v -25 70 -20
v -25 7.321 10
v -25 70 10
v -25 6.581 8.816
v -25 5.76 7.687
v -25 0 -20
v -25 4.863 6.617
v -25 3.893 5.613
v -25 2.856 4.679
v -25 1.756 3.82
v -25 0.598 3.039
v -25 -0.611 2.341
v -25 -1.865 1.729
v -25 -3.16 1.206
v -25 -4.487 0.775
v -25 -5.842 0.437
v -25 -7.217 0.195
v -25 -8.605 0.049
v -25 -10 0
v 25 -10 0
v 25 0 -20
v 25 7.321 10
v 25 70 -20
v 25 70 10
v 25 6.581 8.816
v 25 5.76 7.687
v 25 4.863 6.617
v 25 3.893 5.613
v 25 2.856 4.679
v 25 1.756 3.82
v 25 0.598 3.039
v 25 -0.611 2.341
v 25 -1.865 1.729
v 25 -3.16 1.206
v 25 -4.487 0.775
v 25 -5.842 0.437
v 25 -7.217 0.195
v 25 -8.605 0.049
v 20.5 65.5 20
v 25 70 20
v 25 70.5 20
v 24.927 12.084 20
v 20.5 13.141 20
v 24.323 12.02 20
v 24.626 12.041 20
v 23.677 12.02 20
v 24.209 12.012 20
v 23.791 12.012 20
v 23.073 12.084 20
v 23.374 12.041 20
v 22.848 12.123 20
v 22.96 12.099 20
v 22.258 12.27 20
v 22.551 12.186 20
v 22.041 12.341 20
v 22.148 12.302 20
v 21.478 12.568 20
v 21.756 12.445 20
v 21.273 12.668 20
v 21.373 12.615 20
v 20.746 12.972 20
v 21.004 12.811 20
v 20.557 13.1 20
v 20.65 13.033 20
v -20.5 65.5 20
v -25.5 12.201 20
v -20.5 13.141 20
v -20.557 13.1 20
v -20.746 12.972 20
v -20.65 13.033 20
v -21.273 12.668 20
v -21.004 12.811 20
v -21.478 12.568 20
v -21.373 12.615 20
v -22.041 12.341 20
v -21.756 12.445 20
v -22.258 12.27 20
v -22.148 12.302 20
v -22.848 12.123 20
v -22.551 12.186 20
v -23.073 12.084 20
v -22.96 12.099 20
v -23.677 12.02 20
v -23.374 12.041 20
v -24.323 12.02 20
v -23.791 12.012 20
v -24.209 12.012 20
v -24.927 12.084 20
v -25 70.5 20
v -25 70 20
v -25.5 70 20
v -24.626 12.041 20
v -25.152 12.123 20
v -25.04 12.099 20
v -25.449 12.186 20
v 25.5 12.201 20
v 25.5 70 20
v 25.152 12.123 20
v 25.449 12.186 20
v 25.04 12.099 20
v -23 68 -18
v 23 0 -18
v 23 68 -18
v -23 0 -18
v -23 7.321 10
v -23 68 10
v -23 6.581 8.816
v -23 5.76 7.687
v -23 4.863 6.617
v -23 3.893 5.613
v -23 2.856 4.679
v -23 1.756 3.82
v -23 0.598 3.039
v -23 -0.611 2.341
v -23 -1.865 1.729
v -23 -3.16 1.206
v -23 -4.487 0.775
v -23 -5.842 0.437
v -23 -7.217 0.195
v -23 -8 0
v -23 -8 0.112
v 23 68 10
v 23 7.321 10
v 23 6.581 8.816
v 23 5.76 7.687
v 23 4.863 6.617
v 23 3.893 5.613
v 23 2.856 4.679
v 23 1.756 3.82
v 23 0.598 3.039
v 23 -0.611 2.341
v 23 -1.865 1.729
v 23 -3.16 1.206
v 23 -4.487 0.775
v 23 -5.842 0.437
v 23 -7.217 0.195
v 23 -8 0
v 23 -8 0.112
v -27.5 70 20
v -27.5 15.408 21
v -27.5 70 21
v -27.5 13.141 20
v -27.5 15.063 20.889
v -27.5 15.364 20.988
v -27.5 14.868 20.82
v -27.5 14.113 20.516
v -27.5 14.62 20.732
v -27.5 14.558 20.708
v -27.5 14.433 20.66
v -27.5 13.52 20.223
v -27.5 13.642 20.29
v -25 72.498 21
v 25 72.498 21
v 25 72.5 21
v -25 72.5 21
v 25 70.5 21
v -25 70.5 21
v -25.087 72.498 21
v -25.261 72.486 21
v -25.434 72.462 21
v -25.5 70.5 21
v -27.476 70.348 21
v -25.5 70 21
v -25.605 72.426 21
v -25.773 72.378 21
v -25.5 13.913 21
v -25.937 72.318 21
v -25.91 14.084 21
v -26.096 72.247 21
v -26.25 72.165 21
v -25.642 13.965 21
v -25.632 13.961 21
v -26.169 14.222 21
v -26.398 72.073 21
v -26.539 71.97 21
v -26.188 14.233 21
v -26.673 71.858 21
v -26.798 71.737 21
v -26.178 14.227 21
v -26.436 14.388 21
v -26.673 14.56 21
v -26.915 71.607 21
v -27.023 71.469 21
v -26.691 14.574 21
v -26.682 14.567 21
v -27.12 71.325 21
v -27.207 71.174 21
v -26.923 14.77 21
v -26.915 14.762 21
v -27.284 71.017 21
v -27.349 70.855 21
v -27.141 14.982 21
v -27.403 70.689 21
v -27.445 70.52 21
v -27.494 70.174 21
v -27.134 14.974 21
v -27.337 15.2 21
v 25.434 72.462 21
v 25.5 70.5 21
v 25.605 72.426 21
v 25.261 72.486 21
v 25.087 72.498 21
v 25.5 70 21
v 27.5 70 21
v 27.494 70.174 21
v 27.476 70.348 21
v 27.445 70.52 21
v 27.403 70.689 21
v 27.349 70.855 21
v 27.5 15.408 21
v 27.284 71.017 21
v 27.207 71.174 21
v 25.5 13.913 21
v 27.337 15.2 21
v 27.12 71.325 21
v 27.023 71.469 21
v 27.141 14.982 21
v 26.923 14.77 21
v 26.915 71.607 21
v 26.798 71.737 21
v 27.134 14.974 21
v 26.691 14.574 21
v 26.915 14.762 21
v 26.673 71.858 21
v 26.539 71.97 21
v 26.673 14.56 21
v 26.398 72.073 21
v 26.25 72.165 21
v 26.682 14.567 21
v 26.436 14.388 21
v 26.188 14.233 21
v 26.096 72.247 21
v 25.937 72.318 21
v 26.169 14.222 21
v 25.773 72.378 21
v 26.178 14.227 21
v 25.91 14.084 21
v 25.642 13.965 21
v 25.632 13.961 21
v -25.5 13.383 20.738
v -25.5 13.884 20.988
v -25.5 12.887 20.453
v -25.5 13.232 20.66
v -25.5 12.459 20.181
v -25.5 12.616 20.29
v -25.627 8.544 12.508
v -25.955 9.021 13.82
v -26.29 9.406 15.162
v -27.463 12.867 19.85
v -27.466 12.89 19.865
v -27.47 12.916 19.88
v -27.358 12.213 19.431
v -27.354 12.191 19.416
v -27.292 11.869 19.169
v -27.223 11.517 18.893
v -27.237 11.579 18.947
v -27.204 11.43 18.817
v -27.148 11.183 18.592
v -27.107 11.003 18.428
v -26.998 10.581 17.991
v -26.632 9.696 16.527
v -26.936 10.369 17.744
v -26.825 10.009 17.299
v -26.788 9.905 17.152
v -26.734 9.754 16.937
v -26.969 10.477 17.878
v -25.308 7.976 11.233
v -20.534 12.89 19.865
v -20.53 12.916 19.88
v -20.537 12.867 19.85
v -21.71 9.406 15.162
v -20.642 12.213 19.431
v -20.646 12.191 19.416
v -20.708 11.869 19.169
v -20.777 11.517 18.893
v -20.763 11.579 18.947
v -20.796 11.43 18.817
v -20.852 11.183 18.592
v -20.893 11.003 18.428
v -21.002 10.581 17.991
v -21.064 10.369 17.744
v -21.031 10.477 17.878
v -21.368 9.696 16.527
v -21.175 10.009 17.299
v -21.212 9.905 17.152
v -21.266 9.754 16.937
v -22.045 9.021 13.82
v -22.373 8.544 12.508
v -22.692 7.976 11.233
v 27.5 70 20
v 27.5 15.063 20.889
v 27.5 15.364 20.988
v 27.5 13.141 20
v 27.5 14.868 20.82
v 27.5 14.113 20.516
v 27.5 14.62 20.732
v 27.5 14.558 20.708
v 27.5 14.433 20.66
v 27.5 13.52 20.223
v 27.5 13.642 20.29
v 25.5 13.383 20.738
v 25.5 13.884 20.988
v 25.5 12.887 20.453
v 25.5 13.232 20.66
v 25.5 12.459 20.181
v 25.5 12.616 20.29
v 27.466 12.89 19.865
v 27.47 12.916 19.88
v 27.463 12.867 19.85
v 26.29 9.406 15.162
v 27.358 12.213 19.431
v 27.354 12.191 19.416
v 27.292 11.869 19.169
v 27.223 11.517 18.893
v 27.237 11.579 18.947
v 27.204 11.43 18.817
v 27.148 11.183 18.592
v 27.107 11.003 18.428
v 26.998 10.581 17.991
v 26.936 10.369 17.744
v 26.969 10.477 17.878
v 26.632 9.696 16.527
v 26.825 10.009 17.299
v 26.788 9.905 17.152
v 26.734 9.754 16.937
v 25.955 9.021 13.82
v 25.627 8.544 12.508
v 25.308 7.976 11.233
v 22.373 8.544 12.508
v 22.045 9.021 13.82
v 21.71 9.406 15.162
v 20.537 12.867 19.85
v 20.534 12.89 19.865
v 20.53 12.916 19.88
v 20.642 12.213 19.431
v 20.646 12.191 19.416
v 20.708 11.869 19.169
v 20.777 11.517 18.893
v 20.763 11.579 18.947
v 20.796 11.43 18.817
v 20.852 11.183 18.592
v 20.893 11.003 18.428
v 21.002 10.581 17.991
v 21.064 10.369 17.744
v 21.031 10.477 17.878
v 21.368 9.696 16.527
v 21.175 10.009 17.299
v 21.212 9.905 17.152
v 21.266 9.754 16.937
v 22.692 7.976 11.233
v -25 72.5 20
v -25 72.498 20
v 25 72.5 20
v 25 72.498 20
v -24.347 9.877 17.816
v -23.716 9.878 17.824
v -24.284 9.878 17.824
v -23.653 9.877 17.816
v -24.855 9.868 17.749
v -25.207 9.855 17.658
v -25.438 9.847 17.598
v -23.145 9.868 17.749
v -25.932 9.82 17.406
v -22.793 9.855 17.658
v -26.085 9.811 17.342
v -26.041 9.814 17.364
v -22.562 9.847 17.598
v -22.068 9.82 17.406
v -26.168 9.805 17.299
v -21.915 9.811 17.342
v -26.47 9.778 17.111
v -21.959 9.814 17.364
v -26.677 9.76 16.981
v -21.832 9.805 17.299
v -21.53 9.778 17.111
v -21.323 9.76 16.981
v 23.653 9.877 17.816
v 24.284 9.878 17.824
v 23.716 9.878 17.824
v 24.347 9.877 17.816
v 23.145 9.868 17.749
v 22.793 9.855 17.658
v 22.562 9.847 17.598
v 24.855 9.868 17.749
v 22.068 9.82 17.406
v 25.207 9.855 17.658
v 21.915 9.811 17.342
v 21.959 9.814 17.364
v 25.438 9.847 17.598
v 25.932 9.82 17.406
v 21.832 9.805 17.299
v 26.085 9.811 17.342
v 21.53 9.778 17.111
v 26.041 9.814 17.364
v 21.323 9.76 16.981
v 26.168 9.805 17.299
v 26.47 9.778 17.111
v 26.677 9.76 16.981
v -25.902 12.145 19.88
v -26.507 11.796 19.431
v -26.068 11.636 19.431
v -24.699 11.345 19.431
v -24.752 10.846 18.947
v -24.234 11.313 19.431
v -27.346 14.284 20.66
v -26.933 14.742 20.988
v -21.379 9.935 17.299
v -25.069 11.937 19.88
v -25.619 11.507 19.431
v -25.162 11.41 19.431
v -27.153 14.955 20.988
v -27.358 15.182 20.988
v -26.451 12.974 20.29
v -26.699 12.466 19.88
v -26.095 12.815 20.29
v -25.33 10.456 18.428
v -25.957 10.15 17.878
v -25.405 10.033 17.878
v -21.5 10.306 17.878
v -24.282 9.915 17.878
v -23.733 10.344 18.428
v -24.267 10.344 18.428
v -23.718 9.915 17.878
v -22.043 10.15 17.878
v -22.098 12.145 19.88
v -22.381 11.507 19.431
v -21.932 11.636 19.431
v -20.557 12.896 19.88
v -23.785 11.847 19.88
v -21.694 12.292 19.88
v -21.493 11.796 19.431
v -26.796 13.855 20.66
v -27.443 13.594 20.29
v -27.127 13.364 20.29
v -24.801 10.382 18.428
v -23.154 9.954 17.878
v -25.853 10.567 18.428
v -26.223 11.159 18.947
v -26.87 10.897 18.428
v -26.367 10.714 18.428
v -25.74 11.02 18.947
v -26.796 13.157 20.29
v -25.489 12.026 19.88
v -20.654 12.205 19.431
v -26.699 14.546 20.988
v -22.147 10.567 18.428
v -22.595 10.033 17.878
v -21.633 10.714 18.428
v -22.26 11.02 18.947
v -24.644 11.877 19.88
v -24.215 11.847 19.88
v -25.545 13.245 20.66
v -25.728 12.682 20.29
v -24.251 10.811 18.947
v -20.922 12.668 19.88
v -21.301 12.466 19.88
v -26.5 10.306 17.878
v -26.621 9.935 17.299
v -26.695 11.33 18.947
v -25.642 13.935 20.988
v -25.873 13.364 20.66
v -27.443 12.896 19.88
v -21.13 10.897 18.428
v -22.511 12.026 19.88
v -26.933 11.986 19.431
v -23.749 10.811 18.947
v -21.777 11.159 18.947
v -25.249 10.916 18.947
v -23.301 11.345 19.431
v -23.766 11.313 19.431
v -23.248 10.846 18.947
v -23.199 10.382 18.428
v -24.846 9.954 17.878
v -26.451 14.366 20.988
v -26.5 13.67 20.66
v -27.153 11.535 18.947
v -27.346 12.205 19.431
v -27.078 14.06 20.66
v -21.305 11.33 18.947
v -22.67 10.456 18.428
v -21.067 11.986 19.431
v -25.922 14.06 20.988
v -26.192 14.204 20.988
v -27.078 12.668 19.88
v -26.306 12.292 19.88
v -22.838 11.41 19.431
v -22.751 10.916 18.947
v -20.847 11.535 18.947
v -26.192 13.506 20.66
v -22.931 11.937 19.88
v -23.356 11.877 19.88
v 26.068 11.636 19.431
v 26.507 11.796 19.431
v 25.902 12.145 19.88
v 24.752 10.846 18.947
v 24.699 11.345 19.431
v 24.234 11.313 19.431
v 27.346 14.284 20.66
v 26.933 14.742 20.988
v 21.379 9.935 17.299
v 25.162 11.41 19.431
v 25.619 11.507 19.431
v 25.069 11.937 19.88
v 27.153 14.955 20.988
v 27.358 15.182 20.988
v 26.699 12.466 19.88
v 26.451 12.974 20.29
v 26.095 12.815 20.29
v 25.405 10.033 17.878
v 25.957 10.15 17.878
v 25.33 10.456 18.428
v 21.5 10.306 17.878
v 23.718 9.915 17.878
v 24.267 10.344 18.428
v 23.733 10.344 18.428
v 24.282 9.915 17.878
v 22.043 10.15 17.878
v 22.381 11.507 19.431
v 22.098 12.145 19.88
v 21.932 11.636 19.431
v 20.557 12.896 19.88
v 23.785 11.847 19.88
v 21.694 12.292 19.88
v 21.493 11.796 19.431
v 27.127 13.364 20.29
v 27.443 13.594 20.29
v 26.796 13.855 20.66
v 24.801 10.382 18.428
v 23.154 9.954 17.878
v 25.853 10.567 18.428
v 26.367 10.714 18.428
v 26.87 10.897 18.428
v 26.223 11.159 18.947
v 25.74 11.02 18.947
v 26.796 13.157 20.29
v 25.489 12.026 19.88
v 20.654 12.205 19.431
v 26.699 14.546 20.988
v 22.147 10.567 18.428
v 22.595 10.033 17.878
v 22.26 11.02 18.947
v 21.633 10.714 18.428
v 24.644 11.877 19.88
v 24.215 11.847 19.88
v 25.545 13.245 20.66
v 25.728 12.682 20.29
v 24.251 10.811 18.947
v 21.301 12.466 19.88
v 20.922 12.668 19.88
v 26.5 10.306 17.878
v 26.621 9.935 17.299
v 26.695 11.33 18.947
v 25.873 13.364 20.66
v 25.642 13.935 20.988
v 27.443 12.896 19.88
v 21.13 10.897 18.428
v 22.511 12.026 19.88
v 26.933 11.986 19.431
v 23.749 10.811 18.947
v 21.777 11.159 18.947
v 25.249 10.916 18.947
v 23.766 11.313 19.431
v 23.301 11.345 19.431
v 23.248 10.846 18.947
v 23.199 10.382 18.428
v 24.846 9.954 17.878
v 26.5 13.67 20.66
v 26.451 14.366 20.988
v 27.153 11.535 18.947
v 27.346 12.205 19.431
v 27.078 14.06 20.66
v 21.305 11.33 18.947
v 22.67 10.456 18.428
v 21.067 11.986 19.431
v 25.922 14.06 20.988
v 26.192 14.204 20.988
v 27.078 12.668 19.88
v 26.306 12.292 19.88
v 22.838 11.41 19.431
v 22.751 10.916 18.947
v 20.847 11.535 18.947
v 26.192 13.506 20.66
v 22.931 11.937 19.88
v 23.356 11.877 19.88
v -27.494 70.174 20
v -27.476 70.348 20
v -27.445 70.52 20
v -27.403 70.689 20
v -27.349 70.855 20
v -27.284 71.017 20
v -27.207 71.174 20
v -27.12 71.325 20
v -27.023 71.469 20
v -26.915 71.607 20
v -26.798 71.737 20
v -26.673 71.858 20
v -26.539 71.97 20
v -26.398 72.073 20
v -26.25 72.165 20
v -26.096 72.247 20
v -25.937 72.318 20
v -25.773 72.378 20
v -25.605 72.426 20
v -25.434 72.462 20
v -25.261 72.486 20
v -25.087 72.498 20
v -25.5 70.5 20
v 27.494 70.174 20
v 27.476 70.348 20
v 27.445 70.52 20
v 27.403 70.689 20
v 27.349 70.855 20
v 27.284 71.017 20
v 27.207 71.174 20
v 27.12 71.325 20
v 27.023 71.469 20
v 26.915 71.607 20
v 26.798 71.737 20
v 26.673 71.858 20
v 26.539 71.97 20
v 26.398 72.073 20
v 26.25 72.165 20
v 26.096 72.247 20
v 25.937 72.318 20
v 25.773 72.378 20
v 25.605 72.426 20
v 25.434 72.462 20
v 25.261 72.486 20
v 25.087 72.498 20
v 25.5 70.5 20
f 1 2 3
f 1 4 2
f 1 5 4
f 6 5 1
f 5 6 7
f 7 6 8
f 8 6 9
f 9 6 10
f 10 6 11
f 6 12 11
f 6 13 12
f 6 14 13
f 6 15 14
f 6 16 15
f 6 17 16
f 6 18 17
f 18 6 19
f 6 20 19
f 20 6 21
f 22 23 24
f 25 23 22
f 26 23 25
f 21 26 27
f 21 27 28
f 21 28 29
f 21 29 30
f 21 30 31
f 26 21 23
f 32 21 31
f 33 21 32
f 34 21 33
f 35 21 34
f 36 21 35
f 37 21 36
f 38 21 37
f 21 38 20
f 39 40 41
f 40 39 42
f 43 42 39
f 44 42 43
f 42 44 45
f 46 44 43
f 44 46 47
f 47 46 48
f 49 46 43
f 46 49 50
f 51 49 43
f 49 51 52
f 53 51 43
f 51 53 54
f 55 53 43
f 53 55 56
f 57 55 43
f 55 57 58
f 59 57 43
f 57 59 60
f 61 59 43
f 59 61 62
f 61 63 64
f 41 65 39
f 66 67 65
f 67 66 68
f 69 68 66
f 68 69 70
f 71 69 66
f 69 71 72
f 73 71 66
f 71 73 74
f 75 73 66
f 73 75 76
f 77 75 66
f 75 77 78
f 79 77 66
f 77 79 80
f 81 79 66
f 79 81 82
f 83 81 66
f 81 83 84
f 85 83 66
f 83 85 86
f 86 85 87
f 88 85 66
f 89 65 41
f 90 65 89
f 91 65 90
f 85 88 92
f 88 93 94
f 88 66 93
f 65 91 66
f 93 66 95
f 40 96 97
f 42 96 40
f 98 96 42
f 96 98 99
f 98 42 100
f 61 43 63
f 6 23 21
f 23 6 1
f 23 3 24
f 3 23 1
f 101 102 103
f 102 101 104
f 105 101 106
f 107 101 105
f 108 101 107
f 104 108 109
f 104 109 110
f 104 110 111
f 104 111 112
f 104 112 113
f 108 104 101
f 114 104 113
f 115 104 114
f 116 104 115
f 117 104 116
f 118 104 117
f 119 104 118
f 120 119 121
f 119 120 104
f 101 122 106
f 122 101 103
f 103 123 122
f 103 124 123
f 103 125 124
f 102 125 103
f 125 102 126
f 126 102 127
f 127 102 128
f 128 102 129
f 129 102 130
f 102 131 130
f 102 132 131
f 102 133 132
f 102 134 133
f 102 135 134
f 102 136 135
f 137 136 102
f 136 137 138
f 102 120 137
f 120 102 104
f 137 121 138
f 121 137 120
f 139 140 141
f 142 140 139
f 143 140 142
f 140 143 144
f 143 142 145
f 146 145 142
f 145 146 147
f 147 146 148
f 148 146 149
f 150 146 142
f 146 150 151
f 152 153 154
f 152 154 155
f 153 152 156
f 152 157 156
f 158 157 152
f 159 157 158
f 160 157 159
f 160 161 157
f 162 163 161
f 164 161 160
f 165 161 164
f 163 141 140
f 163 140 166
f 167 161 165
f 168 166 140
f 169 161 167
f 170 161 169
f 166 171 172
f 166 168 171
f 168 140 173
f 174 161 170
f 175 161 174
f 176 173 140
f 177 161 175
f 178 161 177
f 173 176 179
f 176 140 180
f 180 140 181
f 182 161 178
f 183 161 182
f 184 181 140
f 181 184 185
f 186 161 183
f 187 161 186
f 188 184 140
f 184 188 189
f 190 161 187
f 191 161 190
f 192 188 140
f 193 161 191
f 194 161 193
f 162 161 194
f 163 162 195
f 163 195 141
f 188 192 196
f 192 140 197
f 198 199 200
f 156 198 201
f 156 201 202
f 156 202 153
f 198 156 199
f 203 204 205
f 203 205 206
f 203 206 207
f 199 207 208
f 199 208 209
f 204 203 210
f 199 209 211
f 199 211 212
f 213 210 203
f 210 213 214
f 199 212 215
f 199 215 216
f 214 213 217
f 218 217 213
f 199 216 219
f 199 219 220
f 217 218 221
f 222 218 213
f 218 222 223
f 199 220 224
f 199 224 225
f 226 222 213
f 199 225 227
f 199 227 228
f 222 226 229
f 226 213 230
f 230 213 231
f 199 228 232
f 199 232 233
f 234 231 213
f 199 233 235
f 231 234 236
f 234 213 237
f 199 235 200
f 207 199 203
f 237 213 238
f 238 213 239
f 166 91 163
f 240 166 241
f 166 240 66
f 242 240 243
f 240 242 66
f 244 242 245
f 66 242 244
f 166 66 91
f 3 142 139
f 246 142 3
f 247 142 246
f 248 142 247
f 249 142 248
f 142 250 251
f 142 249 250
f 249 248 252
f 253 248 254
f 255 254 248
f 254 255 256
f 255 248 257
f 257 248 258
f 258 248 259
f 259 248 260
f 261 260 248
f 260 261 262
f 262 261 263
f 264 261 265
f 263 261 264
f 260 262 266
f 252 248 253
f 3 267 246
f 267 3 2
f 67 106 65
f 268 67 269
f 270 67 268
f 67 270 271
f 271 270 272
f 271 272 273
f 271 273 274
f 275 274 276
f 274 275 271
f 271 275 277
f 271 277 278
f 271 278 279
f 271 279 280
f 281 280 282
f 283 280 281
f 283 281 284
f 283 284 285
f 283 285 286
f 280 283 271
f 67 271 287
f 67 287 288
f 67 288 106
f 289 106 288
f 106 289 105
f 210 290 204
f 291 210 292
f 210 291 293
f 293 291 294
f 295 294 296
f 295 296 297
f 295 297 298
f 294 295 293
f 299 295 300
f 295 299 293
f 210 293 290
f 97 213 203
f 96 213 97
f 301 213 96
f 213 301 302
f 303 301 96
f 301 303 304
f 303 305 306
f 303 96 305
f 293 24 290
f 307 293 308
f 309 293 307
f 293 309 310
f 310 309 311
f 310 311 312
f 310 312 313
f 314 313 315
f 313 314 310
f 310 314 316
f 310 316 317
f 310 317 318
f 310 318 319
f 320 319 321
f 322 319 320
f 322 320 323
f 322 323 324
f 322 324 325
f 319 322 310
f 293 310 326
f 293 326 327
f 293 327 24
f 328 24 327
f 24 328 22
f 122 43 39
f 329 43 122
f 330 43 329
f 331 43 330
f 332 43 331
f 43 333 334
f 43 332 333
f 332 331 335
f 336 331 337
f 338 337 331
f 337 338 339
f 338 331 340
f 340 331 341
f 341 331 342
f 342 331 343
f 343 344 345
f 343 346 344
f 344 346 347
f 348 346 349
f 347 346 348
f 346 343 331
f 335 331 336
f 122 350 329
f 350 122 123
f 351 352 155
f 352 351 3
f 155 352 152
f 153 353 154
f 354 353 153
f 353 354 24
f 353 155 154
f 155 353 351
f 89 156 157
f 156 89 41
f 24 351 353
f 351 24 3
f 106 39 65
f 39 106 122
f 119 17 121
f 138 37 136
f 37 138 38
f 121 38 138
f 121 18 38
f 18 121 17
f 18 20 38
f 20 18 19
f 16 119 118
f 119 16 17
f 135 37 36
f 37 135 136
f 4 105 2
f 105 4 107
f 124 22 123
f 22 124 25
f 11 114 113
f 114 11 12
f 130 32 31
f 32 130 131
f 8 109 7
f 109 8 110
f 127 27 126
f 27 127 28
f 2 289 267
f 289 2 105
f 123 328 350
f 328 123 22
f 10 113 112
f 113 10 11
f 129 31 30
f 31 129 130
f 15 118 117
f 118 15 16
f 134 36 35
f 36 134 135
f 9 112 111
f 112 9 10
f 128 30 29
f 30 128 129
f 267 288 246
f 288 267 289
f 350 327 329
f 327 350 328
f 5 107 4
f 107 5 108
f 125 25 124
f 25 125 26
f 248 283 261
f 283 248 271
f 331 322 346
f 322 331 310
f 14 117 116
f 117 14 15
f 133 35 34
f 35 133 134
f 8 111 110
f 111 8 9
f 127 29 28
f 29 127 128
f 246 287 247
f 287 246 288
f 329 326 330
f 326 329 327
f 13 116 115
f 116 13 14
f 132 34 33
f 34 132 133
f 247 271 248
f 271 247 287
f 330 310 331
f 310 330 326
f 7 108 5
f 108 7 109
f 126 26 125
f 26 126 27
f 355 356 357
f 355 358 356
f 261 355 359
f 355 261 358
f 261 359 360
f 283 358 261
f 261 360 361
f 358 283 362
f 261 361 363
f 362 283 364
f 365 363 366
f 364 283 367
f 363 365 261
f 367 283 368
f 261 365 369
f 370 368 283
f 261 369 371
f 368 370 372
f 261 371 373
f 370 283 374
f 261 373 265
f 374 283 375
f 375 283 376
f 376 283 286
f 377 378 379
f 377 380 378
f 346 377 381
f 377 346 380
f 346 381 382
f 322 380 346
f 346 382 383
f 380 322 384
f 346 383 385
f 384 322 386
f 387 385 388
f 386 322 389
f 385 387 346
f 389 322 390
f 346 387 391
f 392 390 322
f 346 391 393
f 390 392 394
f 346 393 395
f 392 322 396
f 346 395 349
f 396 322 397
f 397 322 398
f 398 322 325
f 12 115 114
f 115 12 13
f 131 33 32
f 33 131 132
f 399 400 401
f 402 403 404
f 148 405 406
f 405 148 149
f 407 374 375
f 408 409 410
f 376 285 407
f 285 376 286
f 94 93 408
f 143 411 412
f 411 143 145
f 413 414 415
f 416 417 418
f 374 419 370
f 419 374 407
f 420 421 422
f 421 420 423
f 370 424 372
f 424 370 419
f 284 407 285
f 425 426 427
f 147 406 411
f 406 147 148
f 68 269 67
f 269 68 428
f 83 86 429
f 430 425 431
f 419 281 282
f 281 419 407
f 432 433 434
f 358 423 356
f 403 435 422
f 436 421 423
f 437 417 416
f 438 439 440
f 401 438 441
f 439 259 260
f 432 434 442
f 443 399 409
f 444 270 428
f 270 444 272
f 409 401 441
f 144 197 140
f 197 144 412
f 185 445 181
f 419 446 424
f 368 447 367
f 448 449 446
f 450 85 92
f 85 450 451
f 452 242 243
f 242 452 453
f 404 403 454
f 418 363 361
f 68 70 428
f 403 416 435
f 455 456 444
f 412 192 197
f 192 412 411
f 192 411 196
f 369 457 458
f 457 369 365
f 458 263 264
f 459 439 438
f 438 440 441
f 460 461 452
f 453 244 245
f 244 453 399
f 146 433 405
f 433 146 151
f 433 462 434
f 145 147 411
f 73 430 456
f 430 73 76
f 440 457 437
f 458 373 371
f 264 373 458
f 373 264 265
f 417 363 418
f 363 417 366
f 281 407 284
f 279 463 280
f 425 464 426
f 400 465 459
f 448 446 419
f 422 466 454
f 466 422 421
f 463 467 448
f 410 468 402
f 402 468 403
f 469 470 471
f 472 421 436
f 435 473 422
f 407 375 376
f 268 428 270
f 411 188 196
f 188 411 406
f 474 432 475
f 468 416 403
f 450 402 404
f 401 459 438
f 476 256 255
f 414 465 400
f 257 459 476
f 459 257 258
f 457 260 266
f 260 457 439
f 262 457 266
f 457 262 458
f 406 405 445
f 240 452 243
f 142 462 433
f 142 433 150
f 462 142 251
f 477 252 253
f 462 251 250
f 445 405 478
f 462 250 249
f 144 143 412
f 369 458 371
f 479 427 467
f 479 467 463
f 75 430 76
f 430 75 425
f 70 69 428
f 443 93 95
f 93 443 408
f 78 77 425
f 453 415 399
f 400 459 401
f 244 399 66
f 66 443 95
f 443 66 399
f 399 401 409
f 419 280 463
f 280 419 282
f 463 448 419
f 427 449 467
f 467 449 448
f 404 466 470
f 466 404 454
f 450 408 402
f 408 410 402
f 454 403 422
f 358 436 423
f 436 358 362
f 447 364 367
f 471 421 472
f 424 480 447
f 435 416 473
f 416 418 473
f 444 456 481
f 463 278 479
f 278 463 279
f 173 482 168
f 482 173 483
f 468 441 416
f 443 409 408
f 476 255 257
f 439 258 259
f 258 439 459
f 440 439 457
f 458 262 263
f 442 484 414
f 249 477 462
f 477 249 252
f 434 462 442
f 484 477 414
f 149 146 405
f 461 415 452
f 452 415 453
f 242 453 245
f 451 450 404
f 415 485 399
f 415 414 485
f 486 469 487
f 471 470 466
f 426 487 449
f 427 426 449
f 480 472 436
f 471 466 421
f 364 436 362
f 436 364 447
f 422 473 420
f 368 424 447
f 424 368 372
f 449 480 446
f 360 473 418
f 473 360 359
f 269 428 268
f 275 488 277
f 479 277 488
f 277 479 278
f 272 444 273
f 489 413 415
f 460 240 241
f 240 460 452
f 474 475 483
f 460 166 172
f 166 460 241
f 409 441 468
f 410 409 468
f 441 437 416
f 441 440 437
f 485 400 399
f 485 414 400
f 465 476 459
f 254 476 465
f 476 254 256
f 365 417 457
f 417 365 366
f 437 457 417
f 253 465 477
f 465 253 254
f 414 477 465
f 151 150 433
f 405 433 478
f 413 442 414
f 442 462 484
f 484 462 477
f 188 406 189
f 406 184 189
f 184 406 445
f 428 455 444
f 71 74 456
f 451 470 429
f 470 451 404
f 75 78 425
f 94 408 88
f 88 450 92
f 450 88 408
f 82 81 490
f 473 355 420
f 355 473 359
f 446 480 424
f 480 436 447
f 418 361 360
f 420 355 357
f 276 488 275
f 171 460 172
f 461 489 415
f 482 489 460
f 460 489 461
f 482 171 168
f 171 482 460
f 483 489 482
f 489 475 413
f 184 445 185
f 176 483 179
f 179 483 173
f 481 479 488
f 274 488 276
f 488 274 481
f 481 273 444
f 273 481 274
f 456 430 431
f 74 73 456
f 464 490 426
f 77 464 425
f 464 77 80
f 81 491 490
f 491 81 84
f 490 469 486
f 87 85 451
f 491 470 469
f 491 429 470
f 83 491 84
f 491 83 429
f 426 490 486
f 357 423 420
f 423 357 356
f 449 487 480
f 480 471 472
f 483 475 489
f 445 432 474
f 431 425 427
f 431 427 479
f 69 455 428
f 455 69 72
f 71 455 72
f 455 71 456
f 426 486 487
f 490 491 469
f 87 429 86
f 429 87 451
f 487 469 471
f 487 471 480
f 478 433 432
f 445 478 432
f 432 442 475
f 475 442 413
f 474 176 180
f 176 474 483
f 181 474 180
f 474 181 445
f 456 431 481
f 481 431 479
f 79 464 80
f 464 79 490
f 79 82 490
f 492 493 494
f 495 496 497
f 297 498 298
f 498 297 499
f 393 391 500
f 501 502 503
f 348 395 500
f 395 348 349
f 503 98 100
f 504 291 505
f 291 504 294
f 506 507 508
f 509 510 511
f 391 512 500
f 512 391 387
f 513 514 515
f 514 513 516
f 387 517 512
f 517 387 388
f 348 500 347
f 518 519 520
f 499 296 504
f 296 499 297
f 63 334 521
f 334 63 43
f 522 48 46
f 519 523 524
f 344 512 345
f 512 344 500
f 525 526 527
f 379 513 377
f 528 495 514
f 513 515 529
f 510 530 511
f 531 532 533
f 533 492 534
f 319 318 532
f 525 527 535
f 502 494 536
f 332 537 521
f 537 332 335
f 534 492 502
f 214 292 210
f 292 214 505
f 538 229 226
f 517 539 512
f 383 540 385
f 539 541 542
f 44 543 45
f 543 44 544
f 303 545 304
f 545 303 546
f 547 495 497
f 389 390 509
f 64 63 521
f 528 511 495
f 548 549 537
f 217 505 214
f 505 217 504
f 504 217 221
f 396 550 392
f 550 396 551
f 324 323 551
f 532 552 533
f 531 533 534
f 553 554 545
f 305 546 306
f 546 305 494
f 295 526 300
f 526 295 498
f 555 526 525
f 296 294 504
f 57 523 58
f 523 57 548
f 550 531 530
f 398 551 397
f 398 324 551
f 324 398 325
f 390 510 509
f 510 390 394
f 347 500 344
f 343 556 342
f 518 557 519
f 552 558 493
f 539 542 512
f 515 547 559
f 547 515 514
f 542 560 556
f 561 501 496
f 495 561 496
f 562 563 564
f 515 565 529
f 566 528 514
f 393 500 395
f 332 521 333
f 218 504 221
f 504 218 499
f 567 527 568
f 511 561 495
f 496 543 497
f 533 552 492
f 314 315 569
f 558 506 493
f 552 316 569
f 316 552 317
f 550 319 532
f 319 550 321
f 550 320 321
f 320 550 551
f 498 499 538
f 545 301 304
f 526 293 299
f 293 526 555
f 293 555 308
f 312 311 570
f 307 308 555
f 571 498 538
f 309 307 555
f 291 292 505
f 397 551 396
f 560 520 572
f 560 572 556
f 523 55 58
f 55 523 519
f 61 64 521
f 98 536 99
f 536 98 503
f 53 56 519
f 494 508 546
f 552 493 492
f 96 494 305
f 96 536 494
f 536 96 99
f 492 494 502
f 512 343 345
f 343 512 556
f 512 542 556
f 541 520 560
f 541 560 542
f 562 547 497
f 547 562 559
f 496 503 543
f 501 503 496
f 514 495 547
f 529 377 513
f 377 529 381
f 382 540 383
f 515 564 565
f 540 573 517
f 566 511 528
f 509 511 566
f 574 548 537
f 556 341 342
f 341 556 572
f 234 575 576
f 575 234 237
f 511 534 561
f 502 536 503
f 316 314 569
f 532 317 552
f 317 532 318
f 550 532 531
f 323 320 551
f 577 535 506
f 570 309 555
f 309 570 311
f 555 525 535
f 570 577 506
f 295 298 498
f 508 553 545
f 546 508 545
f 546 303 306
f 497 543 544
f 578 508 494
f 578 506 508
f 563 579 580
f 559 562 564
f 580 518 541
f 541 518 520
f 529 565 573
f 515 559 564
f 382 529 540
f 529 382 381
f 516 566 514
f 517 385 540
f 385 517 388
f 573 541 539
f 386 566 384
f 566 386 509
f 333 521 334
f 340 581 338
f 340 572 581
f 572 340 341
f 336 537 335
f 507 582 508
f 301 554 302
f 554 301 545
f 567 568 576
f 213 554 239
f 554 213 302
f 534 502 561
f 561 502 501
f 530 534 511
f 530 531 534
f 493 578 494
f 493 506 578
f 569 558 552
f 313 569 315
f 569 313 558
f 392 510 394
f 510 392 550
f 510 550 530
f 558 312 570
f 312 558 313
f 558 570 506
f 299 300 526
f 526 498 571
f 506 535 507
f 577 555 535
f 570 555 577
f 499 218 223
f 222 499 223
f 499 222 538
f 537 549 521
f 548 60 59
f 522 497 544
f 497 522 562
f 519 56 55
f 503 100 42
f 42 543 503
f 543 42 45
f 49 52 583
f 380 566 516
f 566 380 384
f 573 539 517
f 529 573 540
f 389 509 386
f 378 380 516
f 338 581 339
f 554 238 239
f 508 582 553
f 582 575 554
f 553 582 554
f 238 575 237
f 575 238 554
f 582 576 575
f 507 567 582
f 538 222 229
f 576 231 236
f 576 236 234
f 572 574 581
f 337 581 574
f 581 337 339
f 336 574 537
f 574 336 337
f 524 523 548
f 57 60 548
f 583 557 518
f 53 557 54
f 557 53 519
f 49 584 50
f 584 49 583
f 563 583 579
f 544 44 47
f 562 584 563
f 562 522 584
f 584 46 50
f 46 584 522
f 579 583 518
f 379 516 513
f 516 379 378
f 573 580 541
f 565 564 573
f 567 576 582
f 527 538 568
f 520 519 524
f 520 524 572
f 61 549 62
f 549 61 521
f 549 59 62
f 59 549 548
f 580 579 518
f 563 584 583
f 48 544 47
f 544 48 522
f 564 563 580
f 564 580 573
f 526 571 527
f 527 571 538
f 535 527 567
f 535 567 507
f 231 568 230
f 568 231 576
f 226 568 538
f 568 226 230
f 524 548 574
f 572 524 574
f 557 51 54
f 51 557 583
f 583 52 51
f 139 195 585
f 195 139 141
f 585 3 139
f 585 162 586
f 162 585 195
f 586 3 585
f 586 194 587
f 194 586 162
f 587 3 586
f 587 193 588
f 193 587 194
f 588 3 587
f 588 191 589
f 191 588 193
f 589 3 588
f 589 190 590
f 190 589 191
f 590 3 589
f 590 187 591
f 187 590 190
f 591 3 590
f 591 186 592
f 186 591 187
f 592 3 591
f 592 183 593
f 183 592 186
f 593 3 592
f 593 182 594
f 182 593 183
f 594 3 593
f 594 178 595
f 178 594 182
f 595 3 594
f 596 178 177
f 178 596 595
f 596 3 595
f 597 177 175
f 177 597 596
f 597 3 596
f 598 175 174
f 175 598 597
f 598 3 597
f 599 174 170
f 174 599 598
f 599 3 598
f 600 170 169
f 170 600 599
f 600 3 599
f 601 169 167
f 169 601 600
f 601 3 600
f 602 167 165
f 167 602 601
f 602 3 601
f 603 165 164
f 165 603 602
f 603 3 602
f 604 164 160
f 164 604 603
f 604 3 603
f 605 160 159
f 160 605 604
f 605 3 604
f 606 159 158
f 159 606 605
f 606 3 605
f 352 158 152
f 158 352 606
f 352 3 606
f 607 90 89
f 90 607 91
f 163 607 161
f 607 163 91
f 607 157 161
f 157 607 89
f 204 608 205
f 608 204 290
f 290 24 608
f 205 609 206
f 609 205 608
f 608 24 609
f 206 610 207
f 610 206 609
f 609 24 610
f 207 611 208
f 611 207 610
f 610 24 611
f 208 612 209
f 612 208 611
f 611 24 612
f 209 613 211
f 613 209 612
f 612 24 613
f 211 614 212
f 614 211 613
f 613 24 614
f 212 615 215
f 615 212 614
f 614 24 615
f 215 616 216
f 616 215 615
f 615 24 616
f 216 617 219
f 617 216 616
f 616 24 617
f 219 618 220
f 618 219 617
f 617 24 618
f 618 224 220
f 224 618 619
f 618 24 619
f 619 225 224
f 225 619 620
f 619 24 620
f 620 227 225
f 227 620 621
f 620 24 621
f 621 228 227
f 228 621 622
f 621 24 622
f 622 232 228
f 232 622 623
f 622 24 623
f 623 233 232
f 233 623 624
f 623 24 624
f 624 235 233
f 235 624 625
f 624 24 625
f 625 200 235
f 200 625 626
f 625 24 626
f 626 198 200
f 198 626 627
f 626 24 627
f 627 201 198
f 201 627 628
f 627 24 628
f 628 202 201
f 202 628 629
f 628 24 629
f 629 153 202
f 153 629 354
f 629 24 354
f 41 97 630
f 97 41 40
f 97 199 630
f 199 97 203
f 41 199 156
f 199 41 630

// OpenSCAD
//global
$fn=90;
width=50;
depth=80;
height=40;
wall=2;
tolerance=0.5;

//polygons as modules
module p_box_out(){
 polygon(points=[[0,-height/4],[height/2,0],[height/2,depth-height/4],[0,depth-height/4]]);
}

module p_box_in(){
 polygon(points=[[0,-(height/4-wall)],[height/2-wall,0],[height/2-wall,depth-height/4-wall],[0,depth-height/4-wall]]);
}

module p_mount_out(){
 polygon(points=[[0,0],[-10,0],[-10,tolerance],[-11,tolerance],[-11,tolerance+wall],[-10,tolerance+wall]]);
}

module p_mount_in(){
 polygon(points=[[0,-wall],[-10,-wall],[-10,-(tolerance+2*wall)]]);
}

//other modules
module mount_corner(){
 difference(){
  intersection(){
   rotate_extrude()
    rotate([0,0,-90])
     p_mount_out();
   rotate([0,0,90])
    cube(size=[tolerance+5,tolerance+5,15]);
  }
  translate([0,0,11])
   cube(size=[tolerance*2,tolerance*2,2],center=true);
 }
}

module cut_sphere(){
 difference(){ 
  translate([-15/2,-15,0])
   cube(size=15);
  sphere(r=10);
 }
}

//main
difference(){
 rotate([0,90,0])
  difference(){
   union(){
    difference(){
     linear_extrude(height=width,center=true){
      p_box_out();
      mirror([1,0])
       p_box_out();
     } 
     linear_extrude(height=width-2*wall,center=true){
      p_box_in();
      translate([-(height/2+5),-(height/4-wall)])
       square(size=[height/2+5,depth-2*wall]);
     }
    }
    translate([-(height/2-10),0,-width/2])
     rotate([-90,0,0])
      linear_extrude(height=depth-height/4){
       p_mount_out();
       p_mount_in();
    }
    mirror([0,0,1])
     translate([-(height/2-10),0,-width/2])
      rotate([-90,0,0])
       linear_extrude(height=depth-height/4){
        p_mount_out();
        p_mount_in();
     }
    translate([-(height/2-10),depth-height/4])
     linear_extrude(height=width, center=true){
      p_mount_out();
      p_mount_in();
    }
   }
   translate([-height/2,-height/4])
    cylinder(r=height/2,h=width+10,center=true);
  }
 translate([-(width/2-wall/2),height/4+8,height/2-8])
  cut_sphere();
 mirror([1,0,0])
  translate([-(width/2-wall/2),height/4+8,height/2-8])
   cut_sphere();
}

translate([-width/2,depth-height/4,height/2-10])
 mount_corner();
mirror([1,0,0])
 translate([-width/2,depth-height/4,height/2-10])
  mount_corner();
